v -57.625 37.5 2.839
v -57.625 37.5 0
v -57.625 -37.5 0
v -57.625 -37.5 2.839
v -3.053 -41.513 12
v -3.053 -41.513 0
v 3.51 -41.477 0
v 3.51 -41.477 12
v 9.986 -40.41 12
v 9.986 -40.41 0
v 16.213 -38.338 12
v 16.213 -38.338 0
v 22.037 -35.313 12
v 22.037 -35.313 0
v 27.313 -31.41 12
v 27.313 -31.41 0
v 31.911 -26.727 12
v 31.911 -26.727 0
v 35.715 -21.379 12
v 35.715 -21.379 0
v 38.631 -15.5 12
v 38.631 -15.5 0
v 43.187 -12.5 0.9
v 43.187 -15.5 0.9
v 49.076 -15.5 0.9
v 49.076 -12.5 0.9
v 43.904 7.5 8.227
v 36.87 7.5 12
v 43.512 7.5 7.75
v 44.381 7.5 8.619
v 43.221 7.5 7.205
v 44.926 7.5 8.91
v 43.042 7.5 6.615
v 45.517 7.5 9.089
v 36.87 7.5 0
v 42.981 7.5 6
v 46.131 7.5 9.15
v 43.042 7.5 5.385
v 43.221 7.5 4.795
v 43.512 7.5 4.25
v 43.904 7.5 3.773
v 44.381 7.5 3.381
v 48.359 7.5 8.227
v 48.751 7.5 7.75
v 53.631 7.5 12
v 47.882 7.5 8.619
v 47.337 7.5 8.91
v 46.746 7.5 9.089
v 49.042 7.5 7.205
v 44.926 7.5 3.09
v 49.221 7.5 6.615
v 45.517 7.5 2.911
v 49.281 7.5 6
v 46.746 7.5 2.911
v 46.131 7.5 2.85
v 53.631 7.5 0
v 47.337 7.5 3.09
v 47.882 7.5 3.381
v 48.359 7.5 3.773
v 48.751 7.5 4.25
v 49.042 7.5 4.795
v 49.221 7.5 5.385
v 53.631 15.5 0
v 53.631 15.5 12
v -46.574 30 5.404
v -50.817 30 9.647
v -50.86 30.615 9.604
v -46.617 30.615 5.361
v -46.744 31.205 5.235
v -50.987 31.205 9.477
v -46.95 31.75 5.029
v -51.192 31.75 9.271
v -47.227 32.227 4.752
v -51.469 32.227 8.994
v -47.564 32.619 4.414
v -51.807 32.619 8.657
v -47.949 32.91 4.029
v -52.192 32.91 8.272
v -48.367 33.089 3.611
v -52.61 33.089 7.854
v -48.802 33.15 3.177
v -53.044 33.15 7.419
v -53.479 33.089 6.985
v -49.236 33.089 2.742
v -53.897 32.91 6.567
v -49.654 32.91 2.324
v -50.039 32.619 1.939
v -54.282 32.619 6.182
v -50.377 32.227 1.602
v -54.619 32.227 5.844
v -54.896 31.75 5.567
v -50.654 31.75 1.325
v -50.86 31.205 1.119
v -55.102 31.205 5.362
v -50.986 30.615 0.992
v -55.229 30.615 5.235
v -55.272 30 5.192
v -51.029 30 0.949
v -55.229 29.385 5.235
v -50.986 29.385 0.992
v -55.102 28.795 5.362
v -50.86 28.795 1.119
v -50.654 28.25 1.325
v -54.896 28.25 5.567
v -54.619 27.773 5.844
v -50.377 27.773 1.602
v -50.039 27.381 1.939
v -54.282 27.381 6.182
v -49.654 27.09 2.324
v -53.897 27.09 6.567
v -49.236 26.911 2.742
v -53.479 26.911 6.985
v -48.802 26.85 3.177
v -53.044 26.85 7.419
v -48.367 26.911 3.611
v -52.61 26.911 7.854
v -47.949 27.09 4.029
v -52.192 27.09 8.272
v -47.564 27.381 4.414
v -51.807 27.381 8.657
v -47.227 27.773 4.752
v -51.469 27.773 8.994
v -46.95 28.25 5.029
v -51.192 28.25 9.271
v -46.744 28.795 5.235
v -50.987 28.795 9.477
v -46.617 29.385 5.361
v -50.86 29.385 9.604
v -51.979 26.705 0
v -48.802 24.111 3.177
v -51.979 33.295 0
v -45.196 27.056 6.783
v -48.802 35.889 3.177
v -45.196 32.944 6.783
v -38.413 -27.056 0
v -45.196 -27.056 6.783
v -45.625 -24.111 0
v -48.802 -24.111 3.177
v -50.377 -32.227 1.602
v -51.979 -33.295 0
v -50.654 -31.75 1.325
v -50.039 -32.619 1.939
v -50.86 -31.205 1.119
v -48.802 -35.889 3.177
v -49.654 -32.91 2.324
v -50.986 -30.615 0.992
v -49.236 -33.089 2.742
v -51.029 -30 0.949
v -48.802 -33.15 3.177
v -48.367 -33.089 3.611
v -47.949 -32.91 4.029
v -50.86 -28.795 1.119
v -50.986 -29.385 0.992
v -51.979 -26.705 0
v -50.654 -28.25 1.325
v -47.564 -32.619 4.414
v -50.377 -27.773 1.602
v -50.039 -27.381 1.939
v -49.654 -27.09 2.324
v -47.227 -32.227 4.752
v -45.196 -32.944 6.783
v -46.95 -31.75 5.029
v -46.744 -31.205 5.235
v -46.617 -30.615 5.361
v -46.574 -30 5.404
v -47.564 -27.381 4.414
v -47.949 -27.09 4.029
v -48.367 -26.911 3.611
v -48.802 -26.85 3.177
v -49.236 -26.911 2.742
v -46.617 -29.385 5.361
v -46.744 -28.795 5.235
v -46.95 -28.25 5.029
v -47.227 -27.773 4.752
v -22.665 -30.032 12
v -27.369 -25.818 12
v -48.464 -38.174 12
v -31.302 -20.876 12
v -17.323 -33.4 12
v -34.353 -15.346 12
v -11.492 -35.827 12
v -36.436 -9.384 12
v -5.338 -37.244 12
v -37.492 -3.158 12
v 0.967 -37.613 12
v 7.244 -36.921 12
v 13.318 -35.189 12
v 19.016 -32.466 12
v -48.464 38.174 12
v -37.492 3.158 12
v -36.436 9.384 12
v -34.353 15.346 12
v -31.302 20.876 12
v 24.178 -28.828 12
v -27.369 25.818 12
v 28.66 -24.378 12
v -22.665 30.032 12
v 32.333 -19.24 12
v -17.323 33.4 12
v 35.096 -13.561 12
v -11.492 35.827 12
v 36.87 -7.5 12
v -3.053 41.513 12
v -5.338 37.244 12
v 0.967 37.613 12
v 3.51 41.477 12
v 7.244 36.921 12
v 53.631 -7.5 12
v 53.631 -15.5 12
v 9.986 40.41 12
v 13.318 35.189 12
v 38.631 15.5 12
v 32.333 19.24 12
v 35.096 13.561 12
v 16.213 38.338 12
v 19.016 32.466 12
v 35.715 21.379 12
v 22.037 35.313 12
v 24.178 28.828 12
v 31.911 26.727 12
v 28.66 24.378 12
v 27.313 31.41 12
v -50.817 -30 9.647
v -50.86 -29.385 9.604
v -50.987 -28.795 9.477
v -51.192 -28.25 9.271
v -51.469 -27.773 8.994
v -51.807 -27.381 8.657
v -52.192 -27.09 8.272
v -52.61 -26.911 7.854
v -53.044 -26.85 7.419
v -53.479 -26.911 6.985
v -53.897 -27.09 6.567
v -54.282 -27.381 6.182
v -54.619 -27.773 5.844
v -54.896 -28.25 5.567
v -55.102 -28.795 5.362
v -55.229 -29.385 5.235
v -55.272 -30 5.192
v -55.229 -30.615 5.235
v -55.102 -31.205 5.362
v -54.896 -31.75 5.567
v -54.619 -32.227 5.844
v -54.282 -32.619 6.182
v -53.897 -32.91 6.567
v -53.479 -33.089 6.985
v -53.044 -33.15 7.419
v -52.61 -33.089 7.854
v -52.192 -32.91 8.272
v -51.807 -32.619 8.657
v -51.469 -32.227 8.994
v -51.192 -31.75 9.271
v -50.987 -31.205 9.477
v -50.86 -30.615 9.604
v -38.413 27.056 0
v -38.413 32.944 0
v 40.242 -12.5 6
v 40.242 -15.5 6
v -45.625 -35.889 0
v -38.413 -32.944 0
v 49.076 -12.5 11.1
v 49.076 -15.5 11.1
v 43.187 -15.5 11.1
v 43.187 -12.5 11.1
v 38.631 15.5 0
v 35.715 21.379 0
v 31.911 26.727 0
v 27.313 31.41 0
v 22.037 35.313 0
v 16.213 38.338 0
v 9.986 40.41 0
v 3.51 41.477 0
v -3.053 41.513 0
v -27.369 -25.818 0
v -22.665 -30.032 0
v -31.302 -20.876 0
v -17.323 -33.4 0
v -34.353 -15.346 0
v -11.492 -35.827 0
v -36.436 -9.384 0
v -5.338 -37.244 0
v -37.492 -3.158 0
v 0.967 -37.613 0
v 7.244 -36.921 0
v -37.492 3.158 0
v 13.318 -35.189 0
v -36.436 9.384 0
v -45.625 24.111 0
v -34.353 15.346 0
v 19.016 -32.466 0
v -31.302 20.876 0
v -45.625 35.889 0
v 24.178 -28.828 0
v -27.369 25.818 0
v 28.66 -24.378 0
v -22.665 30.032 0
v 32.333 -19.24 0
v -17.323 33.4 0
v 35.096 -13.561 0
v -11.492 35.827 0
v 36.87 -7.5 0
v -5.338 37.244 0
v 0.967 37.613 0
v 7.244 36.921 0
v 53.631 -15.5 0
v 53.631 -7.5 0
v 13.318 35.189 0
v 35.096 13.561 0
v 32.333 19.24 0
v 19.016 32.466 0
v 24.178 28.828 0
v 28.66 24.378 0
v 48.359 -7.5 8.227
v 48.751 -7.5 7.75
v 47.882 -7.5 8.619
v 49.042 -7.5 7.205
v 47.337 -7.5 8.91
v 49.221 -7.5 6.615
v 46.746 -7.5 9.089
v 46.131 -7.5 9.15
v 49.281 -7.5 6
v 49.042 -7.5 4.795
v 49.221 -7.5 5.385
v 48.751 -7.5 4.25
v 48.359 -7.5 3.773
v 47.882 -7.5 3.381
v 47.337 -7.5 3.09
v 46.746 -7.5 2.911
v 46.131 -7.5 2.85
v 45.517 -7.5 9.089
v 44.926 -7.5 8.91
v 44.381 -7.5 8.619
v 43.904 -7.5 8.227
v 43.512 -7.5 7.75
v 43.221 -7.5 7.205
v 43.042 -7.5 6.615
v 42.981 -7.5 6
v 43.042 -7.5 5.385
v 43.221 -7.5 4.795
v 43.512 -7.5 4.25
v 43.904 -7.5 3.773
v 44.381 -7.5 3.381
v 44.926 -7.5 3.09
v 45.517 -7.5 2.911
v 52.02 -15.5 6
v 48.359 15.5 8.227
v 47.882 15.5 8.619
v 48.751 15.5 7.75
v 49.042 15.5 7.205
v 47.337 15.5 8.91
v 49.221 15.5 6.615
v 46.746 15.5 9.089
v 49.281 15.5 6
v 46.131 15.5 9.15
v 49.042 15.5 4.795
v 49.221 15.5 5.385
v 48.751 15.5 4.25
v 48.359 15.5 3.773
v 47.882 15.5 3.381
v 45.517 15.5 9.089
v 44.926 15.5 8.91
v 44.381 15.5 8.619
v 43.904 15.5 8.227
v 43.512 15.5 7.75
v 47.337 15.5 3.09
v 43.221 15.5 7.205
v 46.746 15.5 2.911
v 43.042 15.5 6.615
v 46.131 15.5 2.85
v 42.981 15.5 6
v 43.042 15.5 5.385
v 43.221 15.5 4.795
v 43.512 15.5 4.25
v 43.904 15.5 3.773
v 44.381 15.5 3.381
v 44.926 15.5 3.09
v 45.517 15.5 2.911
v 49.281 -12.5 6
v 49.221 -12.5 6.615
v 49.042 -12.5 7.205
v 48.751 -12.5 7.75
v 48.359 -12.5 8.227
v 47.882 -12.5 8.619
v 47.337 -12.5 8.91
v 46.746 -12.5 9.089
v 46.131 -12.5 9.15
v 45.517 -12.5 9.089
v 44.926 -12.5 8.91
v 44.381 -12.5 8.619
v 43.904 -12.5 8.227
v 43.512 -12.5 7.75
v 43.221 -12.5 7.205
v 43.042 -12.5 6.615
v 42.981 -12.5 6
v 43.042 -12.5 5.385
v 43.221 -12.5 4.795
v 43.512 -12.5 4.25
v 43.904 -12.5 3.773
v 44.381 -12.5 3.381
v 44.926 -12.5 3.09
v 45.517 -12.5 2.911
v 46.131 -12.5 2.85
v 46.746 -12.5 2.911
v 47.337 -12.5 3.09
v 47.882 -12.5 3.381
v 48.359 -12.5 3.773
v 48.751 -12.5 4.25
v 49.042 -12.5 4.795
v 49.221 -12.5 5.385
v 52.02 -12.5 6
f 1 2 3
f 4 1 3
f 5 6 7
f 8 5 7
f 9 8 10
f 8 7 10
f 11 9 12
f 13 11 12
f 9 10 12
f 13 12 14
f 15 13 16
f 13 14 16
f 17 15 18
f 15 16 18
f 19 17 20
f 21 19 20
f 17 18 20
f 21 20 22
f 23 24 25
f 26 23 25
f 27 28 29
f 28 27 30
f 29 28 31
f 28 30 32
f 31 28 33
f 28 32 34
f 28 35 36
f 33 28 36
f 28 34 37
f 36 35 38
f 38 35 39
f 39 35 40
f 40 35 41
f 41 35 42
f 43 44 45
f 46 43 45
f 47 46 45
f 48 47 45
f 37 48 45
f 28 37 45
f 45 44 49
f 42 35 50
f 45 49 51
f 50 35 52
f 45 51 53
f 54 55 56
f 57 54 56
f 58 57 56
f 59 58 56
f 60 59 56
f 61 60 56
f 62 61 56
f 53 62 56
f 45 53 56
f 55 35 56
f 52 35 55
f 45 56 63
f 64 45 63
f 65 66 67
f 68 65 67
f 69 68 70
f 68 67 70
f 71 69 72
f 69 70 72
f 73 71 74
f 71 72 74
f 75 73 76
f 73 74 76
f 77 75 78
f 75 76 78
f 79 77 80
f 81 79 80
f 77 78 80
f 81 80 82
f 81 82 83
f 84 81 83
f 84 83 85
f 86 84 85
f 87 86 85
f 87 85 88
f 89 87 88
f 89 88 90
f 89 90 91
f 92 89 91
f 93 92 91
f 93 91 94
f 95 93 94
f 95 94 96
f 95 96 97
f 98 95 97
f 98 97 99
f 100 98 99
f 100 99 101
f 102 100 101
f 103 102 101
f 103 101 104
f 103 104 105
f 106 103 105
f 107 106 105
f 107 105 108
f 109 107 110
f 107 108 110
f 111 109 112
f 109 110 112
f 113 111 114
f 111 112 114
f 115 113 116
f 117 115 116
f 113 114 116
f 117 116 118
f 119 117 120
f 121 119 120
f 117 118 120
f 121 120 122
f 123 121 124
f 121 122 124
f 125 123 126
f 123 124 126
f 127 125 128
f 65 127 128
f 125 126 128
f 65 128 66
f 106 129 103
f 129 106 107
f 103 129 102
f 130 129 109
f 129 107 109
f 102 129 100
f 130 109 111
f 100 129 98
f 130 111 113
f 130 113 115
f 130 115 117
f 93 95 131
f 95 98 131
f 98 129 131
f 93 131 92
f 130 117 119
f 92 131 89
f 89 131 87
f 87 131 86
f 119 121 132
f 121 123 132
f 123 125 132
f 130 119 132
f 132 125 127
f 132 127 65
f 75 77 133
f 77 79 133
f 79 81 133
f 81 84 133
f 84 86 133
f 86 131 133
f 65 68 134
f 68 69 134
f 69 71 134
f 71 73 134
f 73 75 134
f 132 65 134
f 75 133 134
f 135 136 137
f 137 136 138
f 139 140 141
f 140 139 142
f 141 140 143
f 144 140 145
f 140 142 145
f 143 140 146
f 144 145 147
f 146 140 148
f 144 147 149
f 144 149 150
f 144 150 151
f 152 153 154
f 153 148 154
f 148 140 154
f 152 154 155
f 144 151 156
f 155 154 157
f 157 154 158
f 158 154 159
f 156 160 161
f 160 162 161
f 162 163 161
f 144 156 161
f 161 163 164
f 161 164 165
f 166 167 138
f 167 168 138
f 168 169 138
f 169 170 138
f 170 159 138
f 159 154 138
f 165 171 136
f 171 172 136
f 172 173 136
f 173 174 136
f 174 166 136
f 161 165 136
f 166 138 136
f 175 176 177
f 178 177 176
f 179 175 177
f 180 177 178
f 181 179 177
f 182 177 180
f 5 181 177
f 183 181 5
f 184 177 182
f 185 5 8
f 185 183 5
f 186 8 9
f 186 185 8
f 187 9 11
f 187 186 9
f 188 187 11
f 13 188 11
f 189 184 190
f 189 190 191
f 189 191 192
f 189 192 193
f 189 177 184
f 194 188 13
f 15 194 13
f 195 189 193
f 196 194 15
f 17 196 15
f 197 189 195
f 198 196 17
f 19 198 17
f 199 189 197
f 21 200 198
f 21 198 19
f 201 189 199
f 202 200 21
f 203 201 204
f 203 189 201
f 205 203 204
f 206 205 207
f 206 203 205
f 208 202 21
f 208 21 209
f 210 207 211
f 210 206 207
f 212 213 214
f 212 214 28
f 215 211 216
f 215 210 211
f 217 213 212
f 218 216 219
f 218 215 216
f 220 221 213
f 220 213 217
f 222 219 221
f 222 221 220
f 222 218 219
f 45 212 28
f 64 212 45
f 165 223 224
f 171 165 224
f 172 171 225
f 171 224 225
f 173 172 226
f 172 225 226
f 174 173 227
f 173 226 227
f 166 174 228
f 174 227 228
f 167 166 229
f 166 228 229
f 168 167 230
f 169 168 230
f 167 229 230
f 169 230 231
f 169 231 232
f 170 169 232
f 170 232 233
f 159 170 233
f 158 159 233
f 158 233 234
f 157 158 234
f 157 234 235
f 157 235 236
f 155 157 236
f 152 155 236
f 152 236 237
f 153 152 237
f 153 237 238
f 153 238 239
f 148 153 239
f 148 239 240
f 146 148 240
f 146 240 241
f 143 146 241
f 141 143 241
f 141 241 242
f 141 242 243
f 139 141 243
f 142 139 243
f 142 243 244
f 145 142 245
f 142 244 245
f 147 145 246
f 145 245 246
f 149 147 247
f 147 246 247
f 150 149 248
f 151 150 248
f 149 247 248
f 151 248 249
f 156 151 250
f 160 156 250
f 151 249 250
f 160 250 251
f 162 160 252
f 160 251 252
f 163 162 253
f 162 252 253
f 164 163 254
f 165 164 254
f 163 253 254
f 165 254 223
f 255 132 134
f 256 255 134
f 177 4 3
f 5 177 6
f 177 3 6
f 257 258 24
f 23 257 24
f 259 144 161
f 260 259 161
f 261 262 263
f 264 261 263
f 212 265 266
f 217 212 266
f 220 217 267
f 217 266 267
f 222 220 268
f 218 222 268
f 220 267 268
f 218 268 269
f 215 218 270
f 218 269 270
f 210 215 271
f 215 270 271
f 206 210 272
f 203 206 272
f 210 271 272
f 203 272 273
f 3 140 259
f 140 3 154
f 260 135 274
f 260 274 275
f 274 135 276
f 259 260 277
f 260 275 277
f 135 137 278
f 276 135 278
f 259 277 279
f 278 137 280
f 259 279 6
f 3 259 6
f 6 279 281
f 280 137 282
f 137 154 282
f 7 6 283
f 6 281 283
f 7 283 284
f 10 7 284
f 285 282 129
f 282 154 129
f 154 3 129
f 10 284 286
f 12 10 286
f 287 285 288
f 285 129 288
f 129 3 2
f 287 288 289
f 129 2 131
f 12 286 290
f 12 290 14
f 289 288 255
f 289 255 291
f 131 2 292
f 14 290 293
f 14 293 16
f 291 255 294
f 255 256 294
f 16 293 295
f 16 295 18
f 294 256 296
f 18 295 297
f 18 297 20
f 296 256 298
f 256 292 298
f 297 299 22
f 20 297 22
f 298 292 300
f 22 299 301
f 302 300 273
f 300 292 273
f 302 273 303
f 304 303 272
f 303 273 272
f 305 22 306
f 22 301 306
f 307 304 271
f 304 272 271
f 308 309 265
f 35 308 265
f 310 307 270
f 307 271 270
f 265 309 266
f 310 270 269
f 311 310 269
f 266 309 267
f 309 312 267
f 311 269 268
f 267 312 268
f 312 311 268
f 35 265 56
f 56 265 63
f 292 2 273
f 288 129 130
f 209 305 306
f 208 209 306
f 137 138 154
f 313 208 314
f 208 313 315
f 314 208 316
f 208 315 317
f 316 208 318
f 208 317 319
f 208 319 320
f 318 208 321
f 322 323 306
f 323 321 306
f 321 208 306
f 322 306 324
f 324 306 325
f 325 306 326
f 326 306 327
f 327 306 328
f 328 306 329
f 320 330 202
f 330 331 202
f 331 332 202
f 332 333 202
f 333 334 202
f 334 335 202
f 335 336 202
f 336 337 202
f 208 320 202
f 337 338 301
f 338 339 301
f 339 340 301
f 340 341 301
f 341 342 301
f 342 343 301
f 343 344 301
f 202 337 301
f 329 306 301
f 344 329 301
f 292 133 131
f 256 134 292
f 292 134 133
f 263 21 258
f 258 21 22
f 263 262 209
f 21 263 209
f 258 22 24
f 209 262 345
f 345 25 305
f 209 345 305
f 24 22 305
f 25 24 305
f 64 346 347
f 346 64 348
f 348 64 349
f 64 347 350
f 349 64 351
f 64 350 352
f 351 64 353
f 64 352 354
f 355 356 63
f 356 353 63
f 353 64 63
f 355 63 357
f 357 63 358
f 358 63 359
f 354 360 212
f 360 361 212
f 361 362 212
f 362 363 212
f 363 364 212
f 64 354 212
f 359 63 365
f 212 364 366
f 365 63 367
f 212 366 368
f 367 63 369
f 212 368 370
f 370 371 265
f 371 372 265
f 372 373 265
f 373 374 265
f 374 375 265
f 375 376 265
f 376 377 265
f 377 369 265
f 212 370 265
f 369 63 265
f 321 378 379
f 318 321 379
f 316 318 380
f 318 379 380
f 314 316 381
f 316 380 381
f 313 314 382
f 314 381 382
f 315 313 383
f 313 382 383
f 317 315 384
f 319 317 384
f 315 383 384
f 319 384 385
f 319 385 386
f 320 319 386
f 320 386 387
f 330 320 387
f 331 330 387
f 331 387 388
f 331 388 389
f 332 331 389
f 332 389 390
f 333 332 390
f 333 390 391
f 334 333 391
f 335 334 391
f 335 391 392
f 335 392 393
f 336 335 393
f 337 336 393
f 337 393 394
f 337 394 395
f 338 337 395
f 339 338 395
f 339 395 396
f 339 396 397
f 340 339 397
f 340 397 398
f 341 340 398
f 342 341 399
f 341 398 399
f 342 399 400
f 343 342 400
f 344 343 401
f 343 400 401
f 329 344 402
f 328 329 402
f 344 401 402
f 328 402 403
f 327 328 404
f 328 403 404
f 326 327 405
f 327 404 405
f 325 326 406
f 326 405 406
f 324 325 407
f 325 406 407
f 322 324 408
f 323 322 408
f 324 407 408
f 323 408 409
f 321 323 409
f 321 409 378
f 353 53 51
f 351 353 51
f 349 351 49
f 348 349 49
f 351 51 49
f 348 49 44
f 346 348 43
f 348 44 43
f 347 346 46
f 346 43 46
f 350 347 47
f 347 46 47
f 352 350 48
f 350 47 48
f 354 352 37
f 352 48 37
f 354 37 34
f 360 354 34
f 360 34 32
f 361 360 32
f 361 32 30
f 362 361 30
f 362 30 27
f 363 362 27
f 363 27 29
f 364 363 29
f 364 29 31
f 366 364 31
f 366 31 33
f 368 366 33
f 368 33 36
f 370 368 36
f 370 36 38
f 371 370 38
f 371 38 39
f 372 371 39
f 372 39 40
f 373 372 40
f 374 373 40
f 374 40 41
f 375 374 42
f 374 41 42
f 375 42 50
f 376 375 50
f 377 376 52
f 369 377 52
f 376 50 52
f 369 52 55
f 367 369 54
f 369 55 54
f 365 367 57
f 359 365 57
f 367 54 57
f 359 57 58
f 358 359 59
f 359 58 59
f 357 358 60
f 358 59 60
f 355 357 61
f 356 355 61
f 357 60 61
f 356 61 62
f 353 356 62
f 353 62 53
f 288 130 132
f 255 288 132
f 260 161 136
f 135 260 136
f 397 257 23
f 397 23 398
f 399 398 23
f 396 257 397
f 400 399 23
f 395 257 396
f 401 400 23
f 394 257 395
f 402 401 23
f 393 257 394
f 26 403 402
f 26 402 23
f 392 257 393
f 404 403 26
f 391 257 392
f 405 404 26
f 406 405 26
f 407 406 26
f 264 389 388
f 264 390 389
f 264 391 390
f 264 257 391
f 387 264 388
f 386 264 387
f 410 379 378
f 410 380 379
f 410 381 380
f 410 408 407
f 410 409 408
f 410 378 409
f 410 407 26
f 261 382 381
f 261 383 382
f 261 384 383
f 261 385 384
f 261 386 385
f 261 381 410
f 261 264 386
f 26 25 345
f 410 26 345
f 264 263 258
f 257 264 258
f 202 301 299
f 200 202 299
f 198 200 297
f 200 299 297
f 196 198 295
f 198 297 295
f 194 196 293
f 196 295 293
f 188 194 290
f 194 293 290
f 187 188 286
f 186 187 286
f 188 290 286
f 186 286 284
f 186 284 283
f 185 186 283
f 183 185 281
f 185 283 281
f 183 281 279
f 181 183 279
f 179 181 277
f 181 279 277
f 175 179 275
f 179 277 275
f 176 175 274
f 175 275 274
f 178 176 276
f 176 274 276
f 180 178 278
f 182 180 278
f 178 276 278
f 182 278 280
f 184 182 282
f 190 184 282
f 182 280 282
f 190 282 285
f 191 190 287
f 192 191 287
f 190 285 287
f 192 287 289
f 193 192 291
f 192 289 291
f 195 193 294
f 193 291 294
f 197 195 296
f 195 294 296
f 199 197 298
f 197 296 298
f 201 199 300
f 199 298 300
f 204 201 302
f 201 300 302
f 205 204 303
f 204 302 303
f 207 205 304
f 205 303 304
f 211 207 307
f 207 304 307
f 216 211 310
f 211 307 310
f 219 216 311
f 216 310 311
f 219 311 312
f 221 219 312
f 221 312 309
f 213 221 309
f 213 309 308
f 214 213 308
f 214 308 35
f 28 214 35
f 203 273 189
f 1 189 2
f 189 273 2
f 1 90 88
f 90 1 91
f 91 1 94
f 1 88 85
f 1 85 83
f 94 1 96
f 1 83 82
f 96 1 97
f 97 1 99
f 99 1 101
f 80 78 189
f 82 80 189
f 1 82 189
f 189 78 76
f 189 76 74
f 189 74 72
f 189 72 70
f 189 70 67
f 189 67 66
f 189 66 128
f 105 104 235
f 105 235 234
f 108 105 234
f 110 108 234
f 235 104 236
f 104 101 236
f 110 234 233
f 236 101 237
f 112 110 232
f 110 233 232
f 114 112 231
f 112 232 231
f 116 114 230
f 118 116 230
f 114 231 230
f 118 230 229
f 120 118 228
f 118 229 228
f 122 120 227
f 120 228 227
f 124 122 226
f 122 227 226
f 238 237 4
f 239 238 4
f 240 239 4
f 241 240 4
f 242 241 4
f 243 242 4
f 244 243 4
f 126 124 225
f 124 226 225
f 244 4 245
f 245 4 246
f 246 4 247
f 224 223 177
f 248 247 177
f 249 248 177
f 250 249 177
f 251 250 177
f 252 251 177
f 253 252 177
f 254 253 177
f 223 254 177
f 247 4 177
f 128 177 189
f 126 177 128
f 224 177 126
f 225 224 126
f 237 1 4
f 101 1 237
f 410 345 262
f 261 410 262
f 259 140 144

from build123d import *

# Parameters (mm, degrees)
F1_DEPTH  = 12
F3_DEPTH  = 50
F4_R      = 3.15
F5_DEPTH  = 80.6785650794
F8_DEPTH  = 74.6785650794
F9_R      = 3.15
F10_DEPTH = 57.126
F12_DEPTH = 3


with BuildPart() as f1:
    # F0 (on Top) → F1 (new body)
    with BuildSketch(Plane.XY):
        with BuildLine():
            ThreePointArc((36.8699149036, -7.5), (-37.625, 0), (36.8699149036, 7.5))
            Line((36.8699149036, 7.5), (53.6314719497, 7.5))
            Line((53.6314719497, 7.5), (53.6314719497, 15.5))
            Line((53.6314719497, 15.5), (38.6314719497, 15.5))
            ThreePointArc((38.6314719497, 15.5), (22.0370581838, 35.3130102314), (-3.0526031231, 41.5129165342))
            ThreePointArc((-3.0526031231, 41.5129165342), (-41.625, 0), (-3.0526031231, -41.5129165342))
            ThreePointArc((-3.0526031231, -41.5129165342), (22.0370581838, -35.3130102314), (38.6314719497, -15.5))
            Line((38.6314719497, -15.5), (53.6314719497, -15.5))
            Line((53.6314719497, -15.5), (53.6314719497, -7.5))
            Line((53.6314719497, -7.5), (36.8699149036, -7.5))
        make_face()
        with BuildLine():
            ThreePointArc((-3.0526031231, -41.5129165342), (-41.625, 0), (-3.0526031231, 41.5129165342))
            Line((-3.0526031231, 41.5129165342), (-57.625, 37.5))
            Line((-57.625, 37.5), (-57.625, -37.5))
            Line((-57.625, -37.5), (-3.0526031231, -41.5129165342))
        make_face()
    extrude(amount=F1_DEPTH)

    # F2 (on Front) → F3 (cut, symmetric)
    with BuildSketch(Plane.XZ):
        Polygon((-57.6562229203, 26.0493437853), (-57.6562229203, 2.8076118446), (-48.4638347648, 12), (-48.4638347648, 26.0493437853), align=None)
    extrude(amount=F3_DEPTH, both=True, mode=Mode.SUBTRACT)

    # F4 (on face) → F5 (cut, through all)
    with BuildSketch(Plane(origin=(-30.2319173824, 0, 30.2319173824), x_dir=(0.7071067812, 0, 0.7071067812), z_dir=(-0.7071067812, 0, 0.7071067812))):
        with Locations((-32.2617468916, 30)):
            Circle(F4_R)
        with Locations((-32.2617468916, -30)):
            Circle(F4_R)
    extrude(amount=-F5_DEPTH, mode=Mode.SUBTRACT)

    # F7 (on offset) → F8 (cut, through all)
    with BuildSketch(Plane(origin=(-25.9892766953, 0, 25.9892766953), x_dir=(0.7071067812, 0, 0.7071067812), z_dir=(-0.7071067812, 0, 0.7071067812))):
        Polygon((-32.2617468916, 24.1110272543), (-27.1617468916, 27.0555136271), (-27.1617468916, 32.9444863729), (-32.2617468916, 35.8889727457), (-37.3617468916, 32.9444863729), (-37.3617468916, 27.0555136271), align=None)
        Polygon((-32.2617468916, -35.8889727457), (-27.1617468916, -32.9444863729), (-27.1617468916, -27.0555136271), (-32.2617468916, -24.1110272543), (-37.3617468916, -27.0555136271), (-37.3617468916, -32.9444863729), align=None)
    extrude(amount=-F8_DEPTH, mode=Mode.SUBTRACT)

    # F9 (on face) → F10 (cut, through all)
    with BuildSketch(Plane.XZ.offset(15.5)):
        with Locations((46.1314719497, 6)):
            Circle(F9_R)
    extrude(amount=-F10_DEPTH, mode=Mode.SUBTRACT)

    # F11 (on face) → F12 (cut)
    with BuildSketch(Plane.XZ.offset(15.5)):
        Polygon((49.0759583226, 0.9), (52.0204446954, 6), (49.0759583226, 11.1), (43.1869855768, 11.1), (40.242499204, 6), (43.1869855768, 0.9), align=None)
    extrude(amount=-F12_DEPTH, mode=Mode.SUBTRACT)


solid = f1.part
